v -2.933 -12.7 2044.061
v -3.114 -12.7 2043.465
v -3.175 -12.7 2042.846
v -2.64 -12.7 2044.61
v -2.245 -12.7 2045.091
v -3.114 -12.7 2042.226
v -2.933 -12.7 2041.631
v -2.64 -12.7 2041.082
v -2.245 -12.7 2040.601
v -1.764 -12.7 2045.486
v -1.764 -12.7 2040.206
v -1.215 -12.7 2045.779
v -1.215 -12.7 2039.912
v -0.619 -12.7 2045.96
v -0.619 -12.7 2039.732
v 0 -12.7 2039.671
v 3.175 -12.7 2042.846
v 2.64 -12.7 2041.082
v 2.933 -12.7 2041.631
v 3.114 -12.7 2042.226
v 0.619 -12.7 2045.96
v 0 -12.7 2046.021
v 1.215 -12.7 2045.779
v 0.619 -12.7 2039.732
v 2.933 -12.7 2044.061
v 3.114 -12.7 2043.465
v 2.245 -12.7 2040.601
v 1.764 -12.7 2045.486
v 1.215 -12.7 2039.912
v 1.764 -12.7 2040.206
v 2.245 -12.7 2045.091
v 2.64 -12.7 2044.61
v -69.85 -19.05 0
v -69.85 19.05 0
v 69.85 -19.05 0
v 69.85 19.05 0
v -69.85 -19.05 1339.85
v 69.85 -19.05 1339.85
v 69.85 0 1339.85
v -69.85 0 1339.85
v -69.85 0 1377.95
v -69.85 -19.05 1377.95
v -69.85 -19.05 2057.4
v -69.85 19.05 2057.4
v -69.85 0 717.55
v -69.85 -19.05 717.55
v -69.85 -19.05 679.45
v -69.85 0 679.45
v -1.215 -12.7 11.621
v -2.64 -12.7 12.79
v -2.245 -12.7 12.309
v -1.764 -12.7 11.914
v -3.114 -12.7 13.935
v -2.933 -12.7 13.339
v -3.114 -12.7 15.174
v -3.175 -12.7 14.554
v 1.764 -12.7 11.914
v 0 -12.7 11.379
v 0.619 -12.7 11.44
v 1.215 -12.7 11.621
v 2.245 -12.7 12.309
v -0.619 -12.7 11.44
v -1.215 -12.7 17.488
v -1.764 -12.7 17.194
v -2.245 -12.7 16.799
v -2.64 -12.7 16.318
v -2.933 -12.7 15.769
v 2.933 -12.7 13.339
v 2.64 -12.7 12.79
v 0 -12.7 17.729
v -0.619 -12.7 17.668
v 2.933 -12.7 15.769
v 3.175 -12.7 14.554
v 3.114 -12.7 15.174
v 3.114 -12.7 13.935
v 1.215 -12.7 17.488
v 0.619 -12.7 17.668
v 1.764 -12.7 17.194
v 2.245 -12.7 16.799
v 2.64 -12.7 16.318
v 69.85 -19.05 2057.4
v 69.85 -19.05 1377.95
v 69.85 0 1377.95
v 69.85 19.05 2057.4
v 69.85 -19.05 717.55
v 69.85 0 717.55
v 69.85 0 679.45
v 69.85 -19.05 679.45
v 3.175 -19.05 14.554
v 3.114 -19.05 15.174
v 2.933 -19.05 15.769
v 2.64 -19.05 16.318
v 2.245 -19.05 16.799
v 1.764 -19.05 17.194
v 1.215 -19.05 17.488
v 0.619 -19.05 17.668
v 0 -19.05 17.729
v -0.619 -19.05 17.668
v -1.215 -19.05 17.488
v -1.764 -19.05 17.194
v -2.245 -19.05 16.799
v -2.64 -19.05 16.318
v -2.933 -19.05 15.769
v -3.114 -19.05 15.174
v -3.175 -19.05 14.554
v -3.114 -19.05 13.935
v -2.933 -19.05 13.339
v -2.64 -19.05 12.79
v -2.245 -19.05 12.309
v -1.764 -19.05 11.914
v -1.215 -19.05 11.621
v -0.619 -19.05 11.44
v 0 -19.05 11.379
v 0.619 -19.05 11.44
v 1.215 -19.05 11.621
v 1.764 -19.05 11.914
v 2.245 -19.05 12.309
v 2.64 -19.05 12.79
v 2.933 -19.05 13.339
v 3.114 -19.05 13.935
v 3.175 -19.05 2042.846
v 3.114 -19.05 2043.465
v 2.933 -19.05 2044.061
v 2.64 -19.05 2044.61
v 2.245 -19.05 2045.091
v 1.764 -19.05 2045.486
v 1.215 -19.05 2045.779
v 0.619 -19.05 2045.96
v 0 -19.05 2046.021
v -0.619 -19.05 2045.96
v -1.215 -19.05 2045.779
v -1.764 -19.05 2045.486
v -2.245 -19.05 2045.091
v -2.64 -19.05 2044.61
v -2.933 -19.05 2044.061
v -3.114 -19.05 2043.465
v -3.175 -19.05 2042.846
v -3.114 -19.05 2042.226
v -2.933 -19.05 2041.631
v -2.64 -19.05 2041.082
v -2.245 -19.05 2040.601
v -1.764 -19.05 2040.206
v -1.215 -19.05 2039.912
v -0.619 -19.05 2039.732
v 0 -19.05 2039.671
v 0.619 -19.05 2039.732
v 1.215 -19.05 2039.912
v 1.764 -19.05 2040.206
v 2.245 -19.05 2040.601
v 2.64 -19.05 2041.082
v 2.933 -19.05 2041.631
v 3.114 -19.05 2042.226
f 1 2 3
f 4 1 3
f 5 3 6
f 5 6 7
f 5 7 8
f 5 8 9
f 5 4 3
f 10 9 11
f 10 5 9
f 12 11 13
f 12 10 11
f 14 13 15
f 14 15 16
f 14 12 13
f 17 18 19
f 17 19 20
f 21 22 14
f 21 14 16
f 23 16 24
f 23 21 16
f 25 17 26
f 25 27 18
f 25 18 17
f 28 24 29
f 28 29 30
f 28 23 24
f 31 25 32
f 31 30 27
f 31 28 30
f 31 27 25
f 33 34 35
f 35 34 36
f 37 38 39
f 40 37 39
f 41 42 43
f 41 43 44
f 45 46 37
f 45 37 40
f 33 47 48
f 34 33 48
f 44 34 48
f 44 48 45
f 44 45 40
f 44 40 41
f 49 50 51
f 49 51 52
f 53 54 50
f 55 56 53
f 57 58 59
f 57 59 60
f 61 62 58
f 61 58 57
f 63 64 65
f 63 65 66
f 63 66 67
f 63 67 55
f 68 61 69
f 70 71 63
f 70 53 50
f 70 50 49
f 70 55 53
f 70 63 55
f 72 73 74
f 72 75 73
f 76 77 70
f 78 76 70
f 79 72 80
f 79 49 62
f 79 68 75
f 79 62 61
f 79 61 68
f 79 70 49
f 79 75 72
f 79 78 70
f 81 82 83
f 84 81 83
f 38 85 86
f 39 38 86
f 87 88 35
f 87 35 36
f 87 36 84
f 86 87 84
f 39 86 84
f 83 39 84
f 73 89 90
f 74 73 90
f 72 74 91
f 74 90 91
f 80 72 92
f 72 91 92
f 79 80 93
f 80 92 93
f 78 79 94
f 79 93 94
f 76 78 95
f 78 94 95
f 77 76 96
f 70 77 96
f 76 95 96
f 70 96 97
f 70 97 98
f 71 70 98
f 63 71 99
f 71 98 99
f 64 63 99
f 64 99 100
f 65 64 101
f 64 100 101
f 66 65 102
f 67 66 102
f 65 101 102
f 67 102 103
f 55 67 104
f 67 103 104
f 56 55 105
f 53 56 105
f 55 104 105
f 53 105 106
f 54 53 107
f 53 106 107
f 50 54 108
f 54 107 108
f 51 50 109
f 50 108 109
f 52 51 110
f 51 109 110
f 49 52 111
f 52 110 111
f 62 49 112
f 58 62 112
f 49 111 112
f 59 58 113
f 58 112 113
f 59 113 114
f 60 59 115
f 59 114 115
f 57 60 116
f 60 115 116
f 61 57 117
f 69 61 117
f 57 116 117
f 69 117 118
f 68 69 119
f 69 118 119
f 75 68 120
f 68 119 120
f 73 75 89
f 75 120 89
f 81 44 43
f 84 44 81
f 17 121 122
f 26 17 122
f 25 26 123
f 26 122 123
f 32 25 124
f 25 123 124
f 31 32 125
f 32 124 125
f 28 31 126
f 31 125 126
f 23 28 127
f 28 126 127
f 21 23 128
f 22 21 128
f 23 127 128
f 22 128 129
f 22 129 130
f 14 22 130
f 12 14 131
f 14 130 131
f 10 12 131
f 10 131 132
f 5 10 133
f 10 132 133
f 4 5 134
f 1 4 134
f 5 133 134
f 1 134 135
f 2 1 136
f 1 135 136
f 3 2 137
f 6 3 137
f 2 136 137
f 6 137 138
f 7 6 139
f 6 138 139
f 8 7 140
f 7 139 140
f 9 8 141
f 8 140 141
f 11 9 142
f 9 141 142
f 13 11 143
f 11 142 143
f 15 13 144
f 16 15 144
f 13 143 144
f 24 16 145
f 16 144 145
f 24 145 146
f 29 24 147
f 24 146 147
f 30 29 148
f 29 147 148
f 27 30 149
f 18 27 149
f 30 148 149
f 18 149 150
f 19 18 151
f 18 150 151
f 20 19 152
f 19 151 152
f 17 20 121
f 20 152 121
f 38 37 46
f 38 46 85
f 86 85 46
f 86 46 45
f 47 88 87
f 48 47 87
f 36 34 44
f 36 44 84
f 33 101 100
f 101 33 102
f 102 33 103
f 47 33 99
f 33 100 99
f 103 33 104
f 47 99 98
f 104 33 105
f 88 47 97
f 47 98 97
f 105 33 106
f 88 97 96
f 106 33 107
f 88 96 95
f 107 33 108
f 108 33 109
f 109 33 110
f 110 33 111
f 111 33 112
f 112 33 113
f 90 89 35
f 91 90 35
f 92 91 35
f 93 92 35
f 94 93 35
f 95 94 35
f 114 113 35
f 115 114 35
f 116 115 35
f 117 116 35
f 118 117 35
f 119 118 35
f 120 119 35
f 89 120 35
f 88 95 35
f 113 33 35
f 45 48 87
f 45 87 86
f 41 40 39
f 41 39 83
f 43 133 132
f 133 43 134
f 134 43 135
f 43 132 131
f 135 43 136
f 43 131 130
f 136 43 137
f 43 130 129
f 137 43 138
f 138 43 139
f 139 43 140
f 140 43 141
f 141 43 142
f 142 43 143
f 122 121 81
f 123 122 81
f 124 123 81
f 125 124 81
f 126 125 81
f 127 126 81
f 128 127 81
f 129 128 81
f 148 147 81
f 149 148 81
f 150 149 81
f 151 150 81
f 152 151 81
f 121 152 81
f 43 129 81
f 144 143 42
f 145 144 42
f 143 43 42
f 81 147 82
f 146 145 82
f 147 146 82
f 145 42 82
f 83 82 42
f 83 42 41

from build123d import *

# Parameters (mm, degrees)
F0_W     = 139.7
F0_H     = 38.1
F1_DEPTH = 2057.4
F2_W     = 19.05
F2_H     = 38.1
F3_DEPTH = 139.7
F5_DEPTH = 6.35
F7_DEPTH = 6.35


with BuildPart() as f1:
    # F0 (on Top) → F1 (new body)
    with BuildSketch(Plane.XY):
        Rectangle(F0_W, F0_H)
    extrude(amount=F1_DEPTH)

    # F2 (on face) → F3 (cut)
    with BuildSketch(Plane.YZ.offset(69.85)):
        with Locations((-9.525, 698.5)):
            Rectangle(F2_W, F2_H)
        with Locations((-9.525, 1358.9)):
            Rectangle(F2_W, F2_H)
    extrude(amount=-F3_DEPTH, mode=Mode.SUBTRACT)

    # F4 (on face) → F5 (cut)
    with BuildSketch(Plane.XZ.offset(19.05)):
        with BuildLine():
            ThreePointArc((-3.175, 2042.8458), (0, 2039.6708), (3.175, 2042.8458))
            Line((3.175, 2042.8458), (-3.175, 2042.8458))
        make_face()
        with BuildLine():
            Line((-3.175, 2042.8458), (3.175, 2042.8458))
            ThreePointArc((3.175, 2042.8458), (0, 2046.0208), (-3.175, 2042.8458))
        make_face()
    extrude(amount=-F5_DEPTH, mode=Mode.SUBTRACT)

    # F6 (on face) → F7 (cut)
    with BuildSketch(Plane.XZ.offset(19.05)):
        with BuildLine():
            ThreePointArc((-3.175, 14.5542), (0, 11.3792), (3.175, 14.5542))
            Line((3.175, 14.5542), (-3.175, 14.5542))
        make_face()
        with BuildLine():
            Line((-3.175, 14.5542), (3.175, 14.5542))
            ThreePointArc((3.175, 14.5542), (0, 17.7292), (-3.175, 14.5542))
        make_face()
    extrude(amount=-F7_DEPTH, mode=Mode.SUBTRACT)


solid = f1.part
